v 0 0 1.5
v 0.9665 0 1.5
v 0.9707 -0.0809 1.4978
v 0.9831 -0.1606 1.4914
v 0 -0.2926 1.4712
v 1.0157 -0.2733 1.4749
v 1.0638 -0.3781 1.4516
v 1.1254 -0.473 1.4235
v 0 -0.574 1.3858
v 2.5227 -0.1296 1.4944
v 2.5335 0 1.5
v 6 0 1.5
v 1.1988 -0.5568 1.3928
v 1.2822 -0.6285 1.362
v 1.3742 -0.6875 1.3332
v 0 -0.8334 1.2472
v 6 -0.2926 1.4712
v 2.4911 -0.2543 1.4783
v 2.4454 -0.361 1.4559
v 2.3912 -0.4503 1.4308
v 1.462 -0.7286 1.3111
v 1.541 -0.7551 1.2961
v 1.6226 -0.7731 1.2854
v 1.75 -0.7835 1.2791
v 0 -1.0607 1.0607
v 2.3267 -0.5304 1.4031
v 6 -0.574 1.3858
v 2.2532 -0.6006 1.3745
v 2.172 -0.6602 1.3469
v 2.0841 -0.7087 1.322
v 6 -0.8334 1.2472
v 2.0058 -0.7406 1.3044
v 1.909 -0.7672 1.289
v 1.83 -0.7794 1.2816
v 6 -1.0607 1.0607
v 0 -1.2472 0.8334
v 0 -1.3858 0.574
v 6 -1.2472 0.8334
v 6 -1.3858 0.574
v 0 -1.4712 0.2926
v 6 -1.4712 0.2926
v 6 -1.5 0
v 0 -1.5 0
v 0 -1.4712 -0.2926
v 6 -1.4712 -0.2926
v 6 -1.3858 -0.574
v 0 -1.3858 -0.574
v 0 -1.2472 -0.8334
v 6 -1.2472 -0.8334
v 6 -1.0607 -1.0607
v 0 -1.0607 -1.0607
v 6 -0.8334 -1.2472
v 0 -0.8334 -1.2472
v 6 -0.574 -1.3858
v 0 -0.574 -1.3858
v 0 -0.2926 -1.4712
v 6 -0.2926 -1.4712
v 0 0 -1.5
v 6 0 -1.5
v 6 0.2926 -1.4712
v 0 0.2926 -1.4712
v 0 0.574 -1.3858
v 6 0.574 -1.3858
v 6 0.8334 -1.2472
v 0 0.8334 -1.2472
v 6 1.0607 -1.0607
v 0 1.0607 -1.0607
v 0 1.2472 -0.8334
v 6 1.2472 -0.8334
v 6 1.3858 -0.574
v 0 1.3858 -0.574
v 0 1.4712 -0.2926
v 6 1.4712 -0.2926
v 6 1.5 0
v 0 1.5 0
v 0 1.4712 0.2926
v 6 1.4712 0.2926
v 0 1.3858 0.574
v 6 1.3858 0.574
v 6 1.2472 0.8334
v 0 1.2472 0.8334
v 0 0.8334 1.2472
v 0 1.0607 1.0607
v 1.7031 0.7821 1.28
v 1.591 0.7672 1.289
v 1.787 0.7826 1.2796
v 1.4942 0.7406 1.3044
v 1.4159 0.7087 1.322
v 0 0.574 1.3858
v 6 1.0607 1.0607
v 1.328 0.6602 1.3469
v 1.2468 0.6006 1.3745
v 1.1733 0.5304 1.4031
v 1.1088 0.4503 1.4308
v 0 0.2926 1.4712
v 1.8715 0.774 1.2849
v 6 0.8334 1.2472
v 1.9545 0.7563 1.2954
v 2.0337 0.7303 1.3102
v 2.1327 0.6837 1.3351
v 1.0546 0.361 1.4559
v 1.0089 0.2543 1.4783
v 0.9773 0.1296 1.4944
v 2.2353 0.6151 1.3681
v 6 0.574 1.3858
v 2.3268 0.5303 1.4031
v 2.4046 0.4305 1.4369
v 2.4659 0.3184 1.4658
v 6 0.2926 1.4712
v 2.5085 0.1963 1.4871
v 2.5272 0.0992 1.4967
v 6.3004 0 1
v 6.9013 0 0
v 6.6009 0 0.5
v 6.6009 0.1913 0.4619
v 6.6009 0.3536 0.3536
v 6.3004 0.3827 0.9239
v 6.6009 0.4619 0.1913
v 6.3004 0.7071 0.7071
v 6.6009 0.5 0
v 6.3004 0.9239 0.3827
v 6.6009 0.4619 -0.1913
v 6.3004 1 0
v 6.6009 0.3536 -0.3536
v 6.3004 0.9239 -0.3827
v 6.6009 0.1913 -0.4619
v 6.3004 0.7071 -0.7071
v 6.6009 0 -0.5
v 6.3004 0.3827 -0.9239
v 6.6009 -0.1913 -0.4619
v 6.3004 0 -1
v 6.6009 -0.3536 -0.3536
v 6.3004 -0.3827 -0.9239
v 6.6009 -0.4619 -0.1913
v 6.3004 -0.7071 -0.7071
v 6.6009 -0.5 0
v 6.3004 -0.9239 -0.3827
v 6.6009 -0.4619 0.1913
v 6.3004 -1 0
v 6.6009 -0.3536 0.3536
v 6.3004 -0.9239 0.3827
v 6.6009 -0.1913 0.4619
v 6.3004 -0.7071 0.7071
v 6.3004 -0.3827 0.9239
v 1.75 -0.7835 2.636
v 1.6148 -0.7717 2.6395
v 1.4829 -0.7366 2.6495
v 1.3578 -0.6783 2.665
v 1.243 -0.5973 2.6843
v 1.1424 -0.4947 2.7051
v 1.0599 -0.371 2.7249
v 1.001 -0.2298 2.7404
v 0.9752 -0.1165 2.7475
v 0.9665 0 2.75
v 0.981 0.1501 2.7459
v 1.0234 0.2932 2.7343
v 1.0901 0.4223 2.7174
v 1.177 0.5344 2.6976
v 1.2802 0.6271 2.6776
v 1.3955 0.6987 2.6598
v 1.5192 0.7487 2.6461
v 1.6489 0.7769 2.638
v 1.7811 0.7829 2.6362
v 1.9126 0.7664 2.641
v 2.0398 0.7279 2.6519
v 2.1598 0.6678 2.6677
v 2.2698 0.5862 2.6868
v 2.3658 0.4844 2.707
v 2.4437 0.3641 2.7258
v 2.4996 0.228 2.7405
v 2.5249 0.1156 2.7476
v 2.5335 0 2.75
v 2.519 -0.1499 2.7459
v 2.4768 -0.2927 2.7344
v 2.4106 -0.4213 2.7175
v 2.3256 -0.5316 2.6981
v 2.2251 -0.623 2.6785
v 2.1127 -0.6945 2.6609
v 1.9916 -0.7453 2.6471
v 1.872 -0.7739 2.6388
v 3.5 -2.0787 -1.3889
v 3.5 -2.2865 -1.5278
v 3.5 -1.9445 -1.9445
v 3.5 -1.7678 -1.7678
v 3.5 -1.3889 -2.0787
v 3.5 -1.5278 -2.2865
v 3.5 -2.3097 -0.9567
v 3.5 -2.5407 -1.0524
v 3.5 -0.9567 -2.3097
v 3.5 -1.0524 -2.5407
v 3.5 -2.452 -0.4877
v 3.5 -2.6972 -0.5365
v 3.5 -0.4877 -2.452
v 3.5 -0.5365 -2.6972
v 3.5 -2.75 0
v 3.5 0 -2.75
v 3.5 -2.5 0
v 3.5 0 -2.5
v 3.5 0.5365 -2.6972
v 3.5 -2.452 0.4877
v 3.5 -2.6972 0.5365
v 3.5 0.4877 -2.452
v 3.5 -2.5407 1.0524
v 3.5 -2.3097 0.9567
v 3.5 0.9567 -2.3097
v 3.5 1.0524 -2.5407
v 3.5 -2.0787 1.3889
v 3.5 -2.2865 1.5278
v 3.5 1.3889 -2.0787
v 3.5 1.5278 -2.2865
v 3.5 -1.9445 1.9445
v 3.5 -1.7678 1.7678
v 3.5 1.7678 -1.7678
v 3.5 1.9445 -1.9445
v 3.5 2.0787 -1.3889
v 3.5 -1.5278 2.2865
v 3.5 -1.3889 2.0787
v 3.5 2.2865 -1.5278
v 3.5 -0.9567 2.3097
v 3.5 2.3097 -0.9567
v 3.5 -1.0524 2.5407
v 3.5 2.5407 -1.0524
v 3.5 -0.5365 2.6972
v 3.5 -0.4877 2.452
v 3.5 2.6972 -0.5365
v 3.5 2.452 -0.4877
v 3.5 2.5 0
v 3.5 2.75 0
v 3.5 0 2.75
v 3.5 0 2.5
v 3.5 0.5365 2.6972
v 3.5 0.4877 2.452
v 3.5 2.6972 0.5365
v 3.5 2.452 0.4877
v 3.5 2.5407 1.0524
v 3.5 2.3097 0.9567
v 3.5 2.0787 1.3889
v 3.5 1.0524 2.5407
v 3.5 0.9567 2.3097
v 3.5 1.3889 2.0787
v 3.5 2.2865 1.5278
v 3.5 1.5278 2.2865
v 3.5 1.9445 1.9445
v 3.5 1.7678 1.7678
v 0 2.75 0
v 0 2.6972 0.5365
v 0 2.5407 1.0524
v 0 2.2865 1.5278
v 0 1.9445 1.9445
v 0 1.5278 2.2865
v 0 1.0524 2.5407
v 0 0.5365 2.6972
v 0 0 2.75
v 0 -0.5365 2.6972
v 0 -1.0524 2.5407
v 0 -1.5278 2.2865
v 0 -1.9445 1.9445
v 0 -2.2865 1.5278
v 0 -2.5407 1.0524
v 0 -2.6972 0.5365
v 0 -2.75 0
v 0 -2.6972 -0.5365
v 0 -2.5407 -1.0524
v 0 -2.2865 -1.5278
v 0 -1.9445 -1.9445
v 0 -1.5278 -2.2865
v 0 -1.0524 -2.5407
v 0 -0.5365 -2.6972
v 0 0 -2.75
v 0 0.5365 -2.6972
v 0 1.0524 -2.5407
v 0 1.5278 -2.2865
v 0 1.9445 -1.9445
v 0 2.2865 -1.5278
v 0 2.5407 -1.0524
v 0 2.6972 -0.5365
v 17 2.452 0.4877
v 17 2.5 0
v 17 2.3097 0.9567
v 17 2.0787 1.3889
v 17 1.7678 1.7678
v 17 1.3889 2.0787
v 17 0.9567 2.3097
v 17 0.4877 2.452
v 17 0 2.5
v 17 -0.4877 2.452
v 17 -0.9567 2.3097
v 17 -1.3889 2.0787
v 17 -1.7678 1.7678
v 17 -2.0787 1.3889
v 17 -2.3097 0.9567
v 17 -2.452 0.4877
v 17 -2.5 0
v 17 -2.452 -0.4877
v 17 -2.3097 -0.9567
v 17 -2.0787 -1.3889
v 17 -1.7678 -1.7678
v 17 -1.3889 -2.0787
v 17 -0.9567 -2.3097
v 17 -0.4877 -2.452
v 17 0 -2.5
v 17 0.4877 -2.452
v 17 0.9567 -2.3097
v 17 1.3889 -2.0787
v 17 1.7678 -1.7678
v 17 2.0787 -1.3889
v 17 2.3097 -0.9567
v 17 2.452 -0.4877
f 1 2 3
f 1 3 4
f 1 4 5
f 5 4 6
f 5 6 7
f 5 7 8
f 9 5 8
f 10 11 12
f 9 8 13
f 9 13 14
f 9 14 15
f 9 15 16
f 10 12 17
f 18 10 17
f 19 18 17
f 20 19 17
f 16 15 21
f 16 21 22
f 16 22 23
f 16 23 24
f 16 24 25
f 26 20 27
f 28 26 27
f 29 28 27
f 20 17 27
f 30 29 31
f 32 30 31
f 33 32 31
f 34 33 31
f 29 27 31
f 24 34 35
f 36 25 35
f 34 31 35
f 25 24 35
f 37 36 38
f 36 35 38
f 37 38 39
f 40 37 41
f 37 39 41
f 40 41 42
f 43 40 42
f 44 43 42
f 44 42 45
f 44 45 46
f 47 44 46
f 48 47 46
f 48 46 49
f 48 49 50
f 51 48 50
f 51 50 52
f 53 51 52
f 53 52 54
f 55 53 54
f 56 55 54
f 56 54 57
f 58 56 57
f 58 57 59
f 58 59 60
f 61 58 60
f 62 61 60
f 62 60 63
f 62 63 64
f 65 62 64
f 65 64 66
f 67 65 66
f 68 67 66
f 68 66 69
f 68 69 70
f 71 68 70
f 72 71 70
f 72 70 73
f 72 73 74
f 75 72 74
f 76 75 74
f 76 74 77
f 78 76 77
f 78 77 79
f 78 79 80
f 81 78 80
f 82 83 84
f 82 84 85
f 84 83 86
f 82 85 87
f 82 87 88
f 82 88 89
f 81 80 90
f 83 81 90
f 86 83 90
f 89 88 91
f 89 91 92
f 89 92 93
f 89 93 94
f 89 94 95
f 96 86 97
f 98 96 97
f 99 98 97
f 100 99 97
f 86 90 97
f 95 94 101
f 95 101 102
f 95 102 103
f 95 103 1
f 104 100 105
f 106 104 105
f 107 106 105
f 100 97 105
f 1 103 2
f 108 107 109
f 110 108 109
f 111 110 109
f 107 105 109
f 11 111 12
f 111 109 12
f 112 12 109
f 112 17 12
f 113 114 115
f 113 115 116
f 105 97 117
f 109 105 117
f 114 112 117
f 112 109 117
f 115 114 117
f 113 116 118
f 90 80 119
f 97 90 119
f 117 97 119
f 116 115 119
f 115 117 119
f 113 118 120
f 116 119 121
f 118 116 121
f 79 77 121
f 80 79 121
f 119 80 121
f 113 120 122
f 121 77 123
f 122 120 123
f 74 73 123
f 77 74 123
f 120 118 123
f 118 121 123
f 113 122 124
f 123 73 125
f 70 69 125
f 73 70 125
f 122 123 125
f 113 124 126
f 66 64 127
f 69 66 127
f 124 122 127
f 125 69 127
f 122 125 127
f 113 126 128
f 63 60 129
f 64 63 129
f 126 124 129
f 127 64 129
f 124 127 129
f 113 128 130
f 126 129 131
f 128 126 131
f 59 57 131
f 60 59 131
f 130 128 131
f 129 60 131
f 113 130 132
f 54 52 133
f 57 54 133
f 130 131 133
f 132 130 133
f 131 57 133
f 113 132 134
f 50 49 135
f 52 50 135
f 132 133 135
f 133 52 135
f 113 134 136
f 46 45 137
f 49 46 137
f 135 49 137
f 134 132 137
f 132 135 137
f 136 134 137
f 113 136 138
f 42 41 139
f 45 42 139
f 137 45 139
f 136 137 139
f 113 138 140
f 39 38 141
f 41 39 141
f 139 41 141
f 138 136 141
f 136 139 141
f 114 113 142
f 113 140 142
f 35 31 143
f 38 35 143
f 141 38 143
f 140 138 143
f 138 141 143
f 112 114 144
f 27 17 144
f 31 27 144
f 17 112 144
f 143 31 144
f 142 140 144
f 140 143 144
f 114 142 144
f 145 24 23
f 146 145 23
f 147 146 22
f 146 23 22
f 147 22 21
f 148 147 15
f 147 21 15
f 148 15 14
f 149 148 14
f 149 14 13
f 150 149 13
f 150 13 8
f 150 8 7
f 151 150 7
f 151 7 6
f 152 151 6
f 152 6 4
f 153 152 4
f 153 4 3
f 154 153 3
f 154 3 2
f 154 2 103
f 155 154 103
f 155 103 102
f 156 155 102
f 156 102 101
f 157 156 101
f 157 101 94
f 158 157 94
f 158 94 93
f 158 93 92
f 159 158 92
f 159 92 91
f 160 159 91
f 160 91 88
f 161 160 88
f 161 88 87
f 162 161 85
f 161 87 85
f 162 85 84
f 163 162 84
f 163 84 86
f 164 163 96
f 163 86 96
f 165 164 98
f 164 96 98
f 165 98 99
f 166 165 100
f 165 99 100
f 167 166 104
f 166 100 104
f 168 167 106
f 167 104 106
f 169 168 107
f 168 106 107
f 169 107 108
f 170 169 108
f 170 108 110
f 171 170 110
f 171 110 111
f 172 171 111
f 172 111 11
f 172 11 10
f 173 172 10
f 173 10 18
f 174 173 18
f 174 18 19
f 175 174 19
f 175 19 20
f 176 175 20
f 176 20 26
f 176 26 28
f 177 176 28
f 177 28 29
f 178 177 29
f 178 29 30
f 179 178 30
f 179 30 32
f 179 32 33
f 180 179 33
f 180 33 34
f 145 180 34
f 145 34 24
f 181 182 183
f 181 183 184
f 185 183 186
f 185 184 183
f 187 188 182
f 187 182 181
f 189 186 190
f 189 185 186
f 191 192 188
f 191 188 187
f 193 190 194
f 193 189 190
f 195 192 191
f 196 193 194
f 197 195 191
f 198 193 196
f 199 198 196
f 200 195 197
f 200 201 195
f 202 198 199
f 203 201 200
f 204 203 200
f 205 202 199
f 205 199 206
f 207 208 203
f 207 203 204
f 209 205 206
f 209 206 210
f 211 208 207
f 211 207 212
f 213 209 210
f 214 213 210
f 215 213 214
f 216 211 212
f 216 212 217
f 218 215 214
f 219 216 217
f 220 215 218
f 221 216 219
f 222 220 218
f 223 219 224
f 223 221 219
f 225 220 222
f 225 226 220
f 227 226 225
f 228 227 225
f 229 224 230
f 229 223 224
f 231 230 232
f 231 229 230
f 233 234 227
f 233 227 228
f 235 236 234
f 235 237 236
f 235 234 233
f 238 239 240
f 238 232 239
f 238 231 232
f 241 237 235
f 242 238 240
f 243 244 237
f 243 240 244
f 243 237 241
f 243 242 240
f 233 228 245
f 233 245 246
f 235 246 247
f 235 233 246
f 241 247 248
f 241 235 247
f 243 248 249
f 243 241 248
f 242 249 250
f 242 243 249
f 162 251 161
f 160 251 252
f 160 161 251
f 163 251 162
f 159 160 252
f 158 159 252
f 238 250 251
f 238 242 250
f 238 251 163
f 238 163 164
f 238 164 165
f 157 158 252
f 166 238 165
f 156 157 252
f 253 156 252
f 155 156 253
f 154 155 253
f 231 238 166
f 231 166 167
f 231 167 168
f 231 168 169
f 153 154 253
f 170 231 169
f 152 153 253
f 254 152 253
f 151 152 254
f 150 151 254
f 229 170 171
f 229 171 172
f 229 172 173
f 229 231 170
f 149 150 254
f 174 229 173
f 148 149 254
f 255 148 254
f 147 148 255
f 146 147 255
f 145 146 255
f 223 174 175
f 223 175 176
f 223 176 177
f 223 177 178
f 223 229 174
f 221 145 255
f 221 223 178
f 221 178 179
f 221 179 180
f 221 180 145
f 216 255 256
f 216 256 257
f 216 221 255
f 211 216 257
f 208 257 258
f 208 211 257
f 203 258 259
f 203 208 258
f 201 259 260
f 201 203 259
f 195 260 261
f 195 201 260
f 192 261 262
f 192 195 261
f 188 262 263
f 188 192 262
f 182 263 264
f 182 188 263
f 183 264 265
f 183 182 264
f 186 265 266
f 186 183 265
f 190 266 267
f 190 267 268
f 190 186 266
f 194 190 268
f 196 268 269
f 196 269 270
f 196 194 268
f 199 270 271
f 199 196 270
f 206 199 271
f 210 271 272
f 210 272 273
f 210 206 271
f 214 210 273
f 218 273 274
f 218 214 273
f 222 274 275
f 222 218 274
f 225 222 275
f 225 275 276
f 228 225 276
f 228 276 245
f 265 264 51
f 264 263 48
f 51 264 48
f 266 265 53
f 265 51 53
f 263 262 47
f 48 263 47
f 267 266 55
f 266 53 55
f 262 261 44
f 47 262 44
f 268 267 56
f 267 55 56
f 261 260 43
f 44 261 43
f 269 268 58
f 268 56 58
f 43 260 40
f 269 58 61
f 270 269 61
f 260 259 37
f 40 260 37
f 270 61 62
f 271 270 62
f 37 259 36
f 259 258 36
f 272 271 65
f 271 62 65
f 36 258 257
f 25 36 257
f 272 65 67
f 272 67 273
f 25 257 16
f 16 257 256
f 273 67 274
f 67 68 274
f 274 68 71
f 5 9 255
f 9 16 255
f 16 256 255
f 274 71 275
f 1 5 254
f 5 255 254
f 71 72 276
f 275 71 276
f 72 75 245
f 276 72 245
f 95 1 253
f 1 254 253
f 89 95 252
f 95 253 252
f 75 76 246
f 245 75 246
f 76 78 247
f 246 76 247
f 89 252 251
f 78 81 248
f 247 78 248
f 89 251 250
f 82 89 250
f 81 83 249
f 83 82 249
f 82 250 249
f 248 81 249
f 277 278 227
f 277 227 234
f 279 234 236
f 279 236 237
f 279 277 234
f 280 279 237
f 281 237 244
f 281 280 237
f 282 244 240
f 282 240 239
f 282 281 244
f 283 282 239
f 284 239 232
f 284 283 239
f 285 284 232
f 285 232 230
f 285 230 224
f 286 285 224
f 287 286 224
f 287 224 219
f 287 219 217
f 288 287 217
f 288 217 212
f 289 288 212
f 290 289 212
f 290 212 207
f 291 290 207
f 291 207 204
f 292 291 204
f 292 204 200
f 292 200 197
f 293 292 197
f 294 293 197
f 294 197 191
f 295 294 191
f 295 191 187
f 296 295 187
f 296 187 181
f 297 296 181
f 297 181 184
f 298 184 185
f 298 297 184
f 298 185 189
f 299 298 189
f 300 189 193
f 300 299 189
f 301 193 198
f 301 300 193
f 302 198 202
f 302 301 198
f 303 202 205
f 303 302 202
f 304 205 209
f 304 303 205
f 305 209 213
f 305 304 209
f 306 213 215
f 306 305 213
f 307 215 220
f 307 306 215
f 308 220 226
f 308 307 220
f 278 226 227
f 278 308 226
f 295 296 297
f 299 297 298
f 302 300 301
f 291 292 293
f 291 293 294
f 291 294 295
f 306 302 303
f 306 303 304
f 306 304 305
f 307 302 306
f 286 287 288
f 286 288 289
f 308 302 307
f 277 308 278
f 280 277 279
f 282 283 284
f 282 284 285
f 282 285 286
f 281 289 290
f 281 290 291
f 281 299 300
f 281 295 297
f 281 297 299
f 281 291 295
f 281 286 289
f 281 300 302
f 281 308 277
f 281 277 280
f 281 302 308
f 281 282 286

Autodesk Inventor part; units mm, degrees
ref_plane "YZ Plane" through (0, 0, 0) normal (1, 0, 0) x (0, 1, 0)
ref_plane "XZ Plane" through (0, 0, 0) normal (0, 1, 0) x (-1, 0, 0)
sketch "Skizze1" plane through (0, 0, 0) normal (0, 0, 1) x (1, 0, 0)
  line L0 (-3.4, 0) -> (20.4, 0) projected
  line L1 (0, -0.55) -> (0, 3.3) projected
  line L2 (0, 2.75) -> (3.5, 2.75)
  line L3 (3.5, 2.75) -> (3.5, 2.5)
  line L4 (3.5, 2.5) -> (17, 2.5)
  line L5 (17, 2.5) -> (17, 0)
  line L6 (17, 0) -> (0, 0)
  line L7 (0, 0) -> (0, 2.75)
  dimension "d0" = 5.5
  dimension "d1" = 5
  dimension "d2" = 3.5
  dimension "d3" = 17
revolve "Umdrehung1" add sketch "Skizze1" angle 360 about axis through (-10, 0, 0) along (1, 0, 0)
hole "Bohrung1" at (0, 0, 0) direction (1, 0, 0) diameter 3 depth 6 tip angle 118
ref_plane "Arbeitsebene1" through (1.75, 0, 2.75) normal (0, 0, 1) x (1, 0, 0)
sketch "Skizze2" plane through (1.75, 0, 2.75) normal (0, 0, 1) x (1, 0, 0)
  line L0 (-5.15, 0) -> (18.65, 0) projected
  line L1 (-1.75, -3.85) -> (-1.75, 3.85) projected
  point P0 (-1.75, 0)
  point P1 (0, 0)
  dimension "d14" = 1.75
hole "Bohrung2" at (1.75, 0, 2.75) direction (0, 0, -1) diameter 1.567 end up to surface thread size "M2x0.4" class "6H" standard "ISO Metric profile"
properties part number "13_1087_027"
